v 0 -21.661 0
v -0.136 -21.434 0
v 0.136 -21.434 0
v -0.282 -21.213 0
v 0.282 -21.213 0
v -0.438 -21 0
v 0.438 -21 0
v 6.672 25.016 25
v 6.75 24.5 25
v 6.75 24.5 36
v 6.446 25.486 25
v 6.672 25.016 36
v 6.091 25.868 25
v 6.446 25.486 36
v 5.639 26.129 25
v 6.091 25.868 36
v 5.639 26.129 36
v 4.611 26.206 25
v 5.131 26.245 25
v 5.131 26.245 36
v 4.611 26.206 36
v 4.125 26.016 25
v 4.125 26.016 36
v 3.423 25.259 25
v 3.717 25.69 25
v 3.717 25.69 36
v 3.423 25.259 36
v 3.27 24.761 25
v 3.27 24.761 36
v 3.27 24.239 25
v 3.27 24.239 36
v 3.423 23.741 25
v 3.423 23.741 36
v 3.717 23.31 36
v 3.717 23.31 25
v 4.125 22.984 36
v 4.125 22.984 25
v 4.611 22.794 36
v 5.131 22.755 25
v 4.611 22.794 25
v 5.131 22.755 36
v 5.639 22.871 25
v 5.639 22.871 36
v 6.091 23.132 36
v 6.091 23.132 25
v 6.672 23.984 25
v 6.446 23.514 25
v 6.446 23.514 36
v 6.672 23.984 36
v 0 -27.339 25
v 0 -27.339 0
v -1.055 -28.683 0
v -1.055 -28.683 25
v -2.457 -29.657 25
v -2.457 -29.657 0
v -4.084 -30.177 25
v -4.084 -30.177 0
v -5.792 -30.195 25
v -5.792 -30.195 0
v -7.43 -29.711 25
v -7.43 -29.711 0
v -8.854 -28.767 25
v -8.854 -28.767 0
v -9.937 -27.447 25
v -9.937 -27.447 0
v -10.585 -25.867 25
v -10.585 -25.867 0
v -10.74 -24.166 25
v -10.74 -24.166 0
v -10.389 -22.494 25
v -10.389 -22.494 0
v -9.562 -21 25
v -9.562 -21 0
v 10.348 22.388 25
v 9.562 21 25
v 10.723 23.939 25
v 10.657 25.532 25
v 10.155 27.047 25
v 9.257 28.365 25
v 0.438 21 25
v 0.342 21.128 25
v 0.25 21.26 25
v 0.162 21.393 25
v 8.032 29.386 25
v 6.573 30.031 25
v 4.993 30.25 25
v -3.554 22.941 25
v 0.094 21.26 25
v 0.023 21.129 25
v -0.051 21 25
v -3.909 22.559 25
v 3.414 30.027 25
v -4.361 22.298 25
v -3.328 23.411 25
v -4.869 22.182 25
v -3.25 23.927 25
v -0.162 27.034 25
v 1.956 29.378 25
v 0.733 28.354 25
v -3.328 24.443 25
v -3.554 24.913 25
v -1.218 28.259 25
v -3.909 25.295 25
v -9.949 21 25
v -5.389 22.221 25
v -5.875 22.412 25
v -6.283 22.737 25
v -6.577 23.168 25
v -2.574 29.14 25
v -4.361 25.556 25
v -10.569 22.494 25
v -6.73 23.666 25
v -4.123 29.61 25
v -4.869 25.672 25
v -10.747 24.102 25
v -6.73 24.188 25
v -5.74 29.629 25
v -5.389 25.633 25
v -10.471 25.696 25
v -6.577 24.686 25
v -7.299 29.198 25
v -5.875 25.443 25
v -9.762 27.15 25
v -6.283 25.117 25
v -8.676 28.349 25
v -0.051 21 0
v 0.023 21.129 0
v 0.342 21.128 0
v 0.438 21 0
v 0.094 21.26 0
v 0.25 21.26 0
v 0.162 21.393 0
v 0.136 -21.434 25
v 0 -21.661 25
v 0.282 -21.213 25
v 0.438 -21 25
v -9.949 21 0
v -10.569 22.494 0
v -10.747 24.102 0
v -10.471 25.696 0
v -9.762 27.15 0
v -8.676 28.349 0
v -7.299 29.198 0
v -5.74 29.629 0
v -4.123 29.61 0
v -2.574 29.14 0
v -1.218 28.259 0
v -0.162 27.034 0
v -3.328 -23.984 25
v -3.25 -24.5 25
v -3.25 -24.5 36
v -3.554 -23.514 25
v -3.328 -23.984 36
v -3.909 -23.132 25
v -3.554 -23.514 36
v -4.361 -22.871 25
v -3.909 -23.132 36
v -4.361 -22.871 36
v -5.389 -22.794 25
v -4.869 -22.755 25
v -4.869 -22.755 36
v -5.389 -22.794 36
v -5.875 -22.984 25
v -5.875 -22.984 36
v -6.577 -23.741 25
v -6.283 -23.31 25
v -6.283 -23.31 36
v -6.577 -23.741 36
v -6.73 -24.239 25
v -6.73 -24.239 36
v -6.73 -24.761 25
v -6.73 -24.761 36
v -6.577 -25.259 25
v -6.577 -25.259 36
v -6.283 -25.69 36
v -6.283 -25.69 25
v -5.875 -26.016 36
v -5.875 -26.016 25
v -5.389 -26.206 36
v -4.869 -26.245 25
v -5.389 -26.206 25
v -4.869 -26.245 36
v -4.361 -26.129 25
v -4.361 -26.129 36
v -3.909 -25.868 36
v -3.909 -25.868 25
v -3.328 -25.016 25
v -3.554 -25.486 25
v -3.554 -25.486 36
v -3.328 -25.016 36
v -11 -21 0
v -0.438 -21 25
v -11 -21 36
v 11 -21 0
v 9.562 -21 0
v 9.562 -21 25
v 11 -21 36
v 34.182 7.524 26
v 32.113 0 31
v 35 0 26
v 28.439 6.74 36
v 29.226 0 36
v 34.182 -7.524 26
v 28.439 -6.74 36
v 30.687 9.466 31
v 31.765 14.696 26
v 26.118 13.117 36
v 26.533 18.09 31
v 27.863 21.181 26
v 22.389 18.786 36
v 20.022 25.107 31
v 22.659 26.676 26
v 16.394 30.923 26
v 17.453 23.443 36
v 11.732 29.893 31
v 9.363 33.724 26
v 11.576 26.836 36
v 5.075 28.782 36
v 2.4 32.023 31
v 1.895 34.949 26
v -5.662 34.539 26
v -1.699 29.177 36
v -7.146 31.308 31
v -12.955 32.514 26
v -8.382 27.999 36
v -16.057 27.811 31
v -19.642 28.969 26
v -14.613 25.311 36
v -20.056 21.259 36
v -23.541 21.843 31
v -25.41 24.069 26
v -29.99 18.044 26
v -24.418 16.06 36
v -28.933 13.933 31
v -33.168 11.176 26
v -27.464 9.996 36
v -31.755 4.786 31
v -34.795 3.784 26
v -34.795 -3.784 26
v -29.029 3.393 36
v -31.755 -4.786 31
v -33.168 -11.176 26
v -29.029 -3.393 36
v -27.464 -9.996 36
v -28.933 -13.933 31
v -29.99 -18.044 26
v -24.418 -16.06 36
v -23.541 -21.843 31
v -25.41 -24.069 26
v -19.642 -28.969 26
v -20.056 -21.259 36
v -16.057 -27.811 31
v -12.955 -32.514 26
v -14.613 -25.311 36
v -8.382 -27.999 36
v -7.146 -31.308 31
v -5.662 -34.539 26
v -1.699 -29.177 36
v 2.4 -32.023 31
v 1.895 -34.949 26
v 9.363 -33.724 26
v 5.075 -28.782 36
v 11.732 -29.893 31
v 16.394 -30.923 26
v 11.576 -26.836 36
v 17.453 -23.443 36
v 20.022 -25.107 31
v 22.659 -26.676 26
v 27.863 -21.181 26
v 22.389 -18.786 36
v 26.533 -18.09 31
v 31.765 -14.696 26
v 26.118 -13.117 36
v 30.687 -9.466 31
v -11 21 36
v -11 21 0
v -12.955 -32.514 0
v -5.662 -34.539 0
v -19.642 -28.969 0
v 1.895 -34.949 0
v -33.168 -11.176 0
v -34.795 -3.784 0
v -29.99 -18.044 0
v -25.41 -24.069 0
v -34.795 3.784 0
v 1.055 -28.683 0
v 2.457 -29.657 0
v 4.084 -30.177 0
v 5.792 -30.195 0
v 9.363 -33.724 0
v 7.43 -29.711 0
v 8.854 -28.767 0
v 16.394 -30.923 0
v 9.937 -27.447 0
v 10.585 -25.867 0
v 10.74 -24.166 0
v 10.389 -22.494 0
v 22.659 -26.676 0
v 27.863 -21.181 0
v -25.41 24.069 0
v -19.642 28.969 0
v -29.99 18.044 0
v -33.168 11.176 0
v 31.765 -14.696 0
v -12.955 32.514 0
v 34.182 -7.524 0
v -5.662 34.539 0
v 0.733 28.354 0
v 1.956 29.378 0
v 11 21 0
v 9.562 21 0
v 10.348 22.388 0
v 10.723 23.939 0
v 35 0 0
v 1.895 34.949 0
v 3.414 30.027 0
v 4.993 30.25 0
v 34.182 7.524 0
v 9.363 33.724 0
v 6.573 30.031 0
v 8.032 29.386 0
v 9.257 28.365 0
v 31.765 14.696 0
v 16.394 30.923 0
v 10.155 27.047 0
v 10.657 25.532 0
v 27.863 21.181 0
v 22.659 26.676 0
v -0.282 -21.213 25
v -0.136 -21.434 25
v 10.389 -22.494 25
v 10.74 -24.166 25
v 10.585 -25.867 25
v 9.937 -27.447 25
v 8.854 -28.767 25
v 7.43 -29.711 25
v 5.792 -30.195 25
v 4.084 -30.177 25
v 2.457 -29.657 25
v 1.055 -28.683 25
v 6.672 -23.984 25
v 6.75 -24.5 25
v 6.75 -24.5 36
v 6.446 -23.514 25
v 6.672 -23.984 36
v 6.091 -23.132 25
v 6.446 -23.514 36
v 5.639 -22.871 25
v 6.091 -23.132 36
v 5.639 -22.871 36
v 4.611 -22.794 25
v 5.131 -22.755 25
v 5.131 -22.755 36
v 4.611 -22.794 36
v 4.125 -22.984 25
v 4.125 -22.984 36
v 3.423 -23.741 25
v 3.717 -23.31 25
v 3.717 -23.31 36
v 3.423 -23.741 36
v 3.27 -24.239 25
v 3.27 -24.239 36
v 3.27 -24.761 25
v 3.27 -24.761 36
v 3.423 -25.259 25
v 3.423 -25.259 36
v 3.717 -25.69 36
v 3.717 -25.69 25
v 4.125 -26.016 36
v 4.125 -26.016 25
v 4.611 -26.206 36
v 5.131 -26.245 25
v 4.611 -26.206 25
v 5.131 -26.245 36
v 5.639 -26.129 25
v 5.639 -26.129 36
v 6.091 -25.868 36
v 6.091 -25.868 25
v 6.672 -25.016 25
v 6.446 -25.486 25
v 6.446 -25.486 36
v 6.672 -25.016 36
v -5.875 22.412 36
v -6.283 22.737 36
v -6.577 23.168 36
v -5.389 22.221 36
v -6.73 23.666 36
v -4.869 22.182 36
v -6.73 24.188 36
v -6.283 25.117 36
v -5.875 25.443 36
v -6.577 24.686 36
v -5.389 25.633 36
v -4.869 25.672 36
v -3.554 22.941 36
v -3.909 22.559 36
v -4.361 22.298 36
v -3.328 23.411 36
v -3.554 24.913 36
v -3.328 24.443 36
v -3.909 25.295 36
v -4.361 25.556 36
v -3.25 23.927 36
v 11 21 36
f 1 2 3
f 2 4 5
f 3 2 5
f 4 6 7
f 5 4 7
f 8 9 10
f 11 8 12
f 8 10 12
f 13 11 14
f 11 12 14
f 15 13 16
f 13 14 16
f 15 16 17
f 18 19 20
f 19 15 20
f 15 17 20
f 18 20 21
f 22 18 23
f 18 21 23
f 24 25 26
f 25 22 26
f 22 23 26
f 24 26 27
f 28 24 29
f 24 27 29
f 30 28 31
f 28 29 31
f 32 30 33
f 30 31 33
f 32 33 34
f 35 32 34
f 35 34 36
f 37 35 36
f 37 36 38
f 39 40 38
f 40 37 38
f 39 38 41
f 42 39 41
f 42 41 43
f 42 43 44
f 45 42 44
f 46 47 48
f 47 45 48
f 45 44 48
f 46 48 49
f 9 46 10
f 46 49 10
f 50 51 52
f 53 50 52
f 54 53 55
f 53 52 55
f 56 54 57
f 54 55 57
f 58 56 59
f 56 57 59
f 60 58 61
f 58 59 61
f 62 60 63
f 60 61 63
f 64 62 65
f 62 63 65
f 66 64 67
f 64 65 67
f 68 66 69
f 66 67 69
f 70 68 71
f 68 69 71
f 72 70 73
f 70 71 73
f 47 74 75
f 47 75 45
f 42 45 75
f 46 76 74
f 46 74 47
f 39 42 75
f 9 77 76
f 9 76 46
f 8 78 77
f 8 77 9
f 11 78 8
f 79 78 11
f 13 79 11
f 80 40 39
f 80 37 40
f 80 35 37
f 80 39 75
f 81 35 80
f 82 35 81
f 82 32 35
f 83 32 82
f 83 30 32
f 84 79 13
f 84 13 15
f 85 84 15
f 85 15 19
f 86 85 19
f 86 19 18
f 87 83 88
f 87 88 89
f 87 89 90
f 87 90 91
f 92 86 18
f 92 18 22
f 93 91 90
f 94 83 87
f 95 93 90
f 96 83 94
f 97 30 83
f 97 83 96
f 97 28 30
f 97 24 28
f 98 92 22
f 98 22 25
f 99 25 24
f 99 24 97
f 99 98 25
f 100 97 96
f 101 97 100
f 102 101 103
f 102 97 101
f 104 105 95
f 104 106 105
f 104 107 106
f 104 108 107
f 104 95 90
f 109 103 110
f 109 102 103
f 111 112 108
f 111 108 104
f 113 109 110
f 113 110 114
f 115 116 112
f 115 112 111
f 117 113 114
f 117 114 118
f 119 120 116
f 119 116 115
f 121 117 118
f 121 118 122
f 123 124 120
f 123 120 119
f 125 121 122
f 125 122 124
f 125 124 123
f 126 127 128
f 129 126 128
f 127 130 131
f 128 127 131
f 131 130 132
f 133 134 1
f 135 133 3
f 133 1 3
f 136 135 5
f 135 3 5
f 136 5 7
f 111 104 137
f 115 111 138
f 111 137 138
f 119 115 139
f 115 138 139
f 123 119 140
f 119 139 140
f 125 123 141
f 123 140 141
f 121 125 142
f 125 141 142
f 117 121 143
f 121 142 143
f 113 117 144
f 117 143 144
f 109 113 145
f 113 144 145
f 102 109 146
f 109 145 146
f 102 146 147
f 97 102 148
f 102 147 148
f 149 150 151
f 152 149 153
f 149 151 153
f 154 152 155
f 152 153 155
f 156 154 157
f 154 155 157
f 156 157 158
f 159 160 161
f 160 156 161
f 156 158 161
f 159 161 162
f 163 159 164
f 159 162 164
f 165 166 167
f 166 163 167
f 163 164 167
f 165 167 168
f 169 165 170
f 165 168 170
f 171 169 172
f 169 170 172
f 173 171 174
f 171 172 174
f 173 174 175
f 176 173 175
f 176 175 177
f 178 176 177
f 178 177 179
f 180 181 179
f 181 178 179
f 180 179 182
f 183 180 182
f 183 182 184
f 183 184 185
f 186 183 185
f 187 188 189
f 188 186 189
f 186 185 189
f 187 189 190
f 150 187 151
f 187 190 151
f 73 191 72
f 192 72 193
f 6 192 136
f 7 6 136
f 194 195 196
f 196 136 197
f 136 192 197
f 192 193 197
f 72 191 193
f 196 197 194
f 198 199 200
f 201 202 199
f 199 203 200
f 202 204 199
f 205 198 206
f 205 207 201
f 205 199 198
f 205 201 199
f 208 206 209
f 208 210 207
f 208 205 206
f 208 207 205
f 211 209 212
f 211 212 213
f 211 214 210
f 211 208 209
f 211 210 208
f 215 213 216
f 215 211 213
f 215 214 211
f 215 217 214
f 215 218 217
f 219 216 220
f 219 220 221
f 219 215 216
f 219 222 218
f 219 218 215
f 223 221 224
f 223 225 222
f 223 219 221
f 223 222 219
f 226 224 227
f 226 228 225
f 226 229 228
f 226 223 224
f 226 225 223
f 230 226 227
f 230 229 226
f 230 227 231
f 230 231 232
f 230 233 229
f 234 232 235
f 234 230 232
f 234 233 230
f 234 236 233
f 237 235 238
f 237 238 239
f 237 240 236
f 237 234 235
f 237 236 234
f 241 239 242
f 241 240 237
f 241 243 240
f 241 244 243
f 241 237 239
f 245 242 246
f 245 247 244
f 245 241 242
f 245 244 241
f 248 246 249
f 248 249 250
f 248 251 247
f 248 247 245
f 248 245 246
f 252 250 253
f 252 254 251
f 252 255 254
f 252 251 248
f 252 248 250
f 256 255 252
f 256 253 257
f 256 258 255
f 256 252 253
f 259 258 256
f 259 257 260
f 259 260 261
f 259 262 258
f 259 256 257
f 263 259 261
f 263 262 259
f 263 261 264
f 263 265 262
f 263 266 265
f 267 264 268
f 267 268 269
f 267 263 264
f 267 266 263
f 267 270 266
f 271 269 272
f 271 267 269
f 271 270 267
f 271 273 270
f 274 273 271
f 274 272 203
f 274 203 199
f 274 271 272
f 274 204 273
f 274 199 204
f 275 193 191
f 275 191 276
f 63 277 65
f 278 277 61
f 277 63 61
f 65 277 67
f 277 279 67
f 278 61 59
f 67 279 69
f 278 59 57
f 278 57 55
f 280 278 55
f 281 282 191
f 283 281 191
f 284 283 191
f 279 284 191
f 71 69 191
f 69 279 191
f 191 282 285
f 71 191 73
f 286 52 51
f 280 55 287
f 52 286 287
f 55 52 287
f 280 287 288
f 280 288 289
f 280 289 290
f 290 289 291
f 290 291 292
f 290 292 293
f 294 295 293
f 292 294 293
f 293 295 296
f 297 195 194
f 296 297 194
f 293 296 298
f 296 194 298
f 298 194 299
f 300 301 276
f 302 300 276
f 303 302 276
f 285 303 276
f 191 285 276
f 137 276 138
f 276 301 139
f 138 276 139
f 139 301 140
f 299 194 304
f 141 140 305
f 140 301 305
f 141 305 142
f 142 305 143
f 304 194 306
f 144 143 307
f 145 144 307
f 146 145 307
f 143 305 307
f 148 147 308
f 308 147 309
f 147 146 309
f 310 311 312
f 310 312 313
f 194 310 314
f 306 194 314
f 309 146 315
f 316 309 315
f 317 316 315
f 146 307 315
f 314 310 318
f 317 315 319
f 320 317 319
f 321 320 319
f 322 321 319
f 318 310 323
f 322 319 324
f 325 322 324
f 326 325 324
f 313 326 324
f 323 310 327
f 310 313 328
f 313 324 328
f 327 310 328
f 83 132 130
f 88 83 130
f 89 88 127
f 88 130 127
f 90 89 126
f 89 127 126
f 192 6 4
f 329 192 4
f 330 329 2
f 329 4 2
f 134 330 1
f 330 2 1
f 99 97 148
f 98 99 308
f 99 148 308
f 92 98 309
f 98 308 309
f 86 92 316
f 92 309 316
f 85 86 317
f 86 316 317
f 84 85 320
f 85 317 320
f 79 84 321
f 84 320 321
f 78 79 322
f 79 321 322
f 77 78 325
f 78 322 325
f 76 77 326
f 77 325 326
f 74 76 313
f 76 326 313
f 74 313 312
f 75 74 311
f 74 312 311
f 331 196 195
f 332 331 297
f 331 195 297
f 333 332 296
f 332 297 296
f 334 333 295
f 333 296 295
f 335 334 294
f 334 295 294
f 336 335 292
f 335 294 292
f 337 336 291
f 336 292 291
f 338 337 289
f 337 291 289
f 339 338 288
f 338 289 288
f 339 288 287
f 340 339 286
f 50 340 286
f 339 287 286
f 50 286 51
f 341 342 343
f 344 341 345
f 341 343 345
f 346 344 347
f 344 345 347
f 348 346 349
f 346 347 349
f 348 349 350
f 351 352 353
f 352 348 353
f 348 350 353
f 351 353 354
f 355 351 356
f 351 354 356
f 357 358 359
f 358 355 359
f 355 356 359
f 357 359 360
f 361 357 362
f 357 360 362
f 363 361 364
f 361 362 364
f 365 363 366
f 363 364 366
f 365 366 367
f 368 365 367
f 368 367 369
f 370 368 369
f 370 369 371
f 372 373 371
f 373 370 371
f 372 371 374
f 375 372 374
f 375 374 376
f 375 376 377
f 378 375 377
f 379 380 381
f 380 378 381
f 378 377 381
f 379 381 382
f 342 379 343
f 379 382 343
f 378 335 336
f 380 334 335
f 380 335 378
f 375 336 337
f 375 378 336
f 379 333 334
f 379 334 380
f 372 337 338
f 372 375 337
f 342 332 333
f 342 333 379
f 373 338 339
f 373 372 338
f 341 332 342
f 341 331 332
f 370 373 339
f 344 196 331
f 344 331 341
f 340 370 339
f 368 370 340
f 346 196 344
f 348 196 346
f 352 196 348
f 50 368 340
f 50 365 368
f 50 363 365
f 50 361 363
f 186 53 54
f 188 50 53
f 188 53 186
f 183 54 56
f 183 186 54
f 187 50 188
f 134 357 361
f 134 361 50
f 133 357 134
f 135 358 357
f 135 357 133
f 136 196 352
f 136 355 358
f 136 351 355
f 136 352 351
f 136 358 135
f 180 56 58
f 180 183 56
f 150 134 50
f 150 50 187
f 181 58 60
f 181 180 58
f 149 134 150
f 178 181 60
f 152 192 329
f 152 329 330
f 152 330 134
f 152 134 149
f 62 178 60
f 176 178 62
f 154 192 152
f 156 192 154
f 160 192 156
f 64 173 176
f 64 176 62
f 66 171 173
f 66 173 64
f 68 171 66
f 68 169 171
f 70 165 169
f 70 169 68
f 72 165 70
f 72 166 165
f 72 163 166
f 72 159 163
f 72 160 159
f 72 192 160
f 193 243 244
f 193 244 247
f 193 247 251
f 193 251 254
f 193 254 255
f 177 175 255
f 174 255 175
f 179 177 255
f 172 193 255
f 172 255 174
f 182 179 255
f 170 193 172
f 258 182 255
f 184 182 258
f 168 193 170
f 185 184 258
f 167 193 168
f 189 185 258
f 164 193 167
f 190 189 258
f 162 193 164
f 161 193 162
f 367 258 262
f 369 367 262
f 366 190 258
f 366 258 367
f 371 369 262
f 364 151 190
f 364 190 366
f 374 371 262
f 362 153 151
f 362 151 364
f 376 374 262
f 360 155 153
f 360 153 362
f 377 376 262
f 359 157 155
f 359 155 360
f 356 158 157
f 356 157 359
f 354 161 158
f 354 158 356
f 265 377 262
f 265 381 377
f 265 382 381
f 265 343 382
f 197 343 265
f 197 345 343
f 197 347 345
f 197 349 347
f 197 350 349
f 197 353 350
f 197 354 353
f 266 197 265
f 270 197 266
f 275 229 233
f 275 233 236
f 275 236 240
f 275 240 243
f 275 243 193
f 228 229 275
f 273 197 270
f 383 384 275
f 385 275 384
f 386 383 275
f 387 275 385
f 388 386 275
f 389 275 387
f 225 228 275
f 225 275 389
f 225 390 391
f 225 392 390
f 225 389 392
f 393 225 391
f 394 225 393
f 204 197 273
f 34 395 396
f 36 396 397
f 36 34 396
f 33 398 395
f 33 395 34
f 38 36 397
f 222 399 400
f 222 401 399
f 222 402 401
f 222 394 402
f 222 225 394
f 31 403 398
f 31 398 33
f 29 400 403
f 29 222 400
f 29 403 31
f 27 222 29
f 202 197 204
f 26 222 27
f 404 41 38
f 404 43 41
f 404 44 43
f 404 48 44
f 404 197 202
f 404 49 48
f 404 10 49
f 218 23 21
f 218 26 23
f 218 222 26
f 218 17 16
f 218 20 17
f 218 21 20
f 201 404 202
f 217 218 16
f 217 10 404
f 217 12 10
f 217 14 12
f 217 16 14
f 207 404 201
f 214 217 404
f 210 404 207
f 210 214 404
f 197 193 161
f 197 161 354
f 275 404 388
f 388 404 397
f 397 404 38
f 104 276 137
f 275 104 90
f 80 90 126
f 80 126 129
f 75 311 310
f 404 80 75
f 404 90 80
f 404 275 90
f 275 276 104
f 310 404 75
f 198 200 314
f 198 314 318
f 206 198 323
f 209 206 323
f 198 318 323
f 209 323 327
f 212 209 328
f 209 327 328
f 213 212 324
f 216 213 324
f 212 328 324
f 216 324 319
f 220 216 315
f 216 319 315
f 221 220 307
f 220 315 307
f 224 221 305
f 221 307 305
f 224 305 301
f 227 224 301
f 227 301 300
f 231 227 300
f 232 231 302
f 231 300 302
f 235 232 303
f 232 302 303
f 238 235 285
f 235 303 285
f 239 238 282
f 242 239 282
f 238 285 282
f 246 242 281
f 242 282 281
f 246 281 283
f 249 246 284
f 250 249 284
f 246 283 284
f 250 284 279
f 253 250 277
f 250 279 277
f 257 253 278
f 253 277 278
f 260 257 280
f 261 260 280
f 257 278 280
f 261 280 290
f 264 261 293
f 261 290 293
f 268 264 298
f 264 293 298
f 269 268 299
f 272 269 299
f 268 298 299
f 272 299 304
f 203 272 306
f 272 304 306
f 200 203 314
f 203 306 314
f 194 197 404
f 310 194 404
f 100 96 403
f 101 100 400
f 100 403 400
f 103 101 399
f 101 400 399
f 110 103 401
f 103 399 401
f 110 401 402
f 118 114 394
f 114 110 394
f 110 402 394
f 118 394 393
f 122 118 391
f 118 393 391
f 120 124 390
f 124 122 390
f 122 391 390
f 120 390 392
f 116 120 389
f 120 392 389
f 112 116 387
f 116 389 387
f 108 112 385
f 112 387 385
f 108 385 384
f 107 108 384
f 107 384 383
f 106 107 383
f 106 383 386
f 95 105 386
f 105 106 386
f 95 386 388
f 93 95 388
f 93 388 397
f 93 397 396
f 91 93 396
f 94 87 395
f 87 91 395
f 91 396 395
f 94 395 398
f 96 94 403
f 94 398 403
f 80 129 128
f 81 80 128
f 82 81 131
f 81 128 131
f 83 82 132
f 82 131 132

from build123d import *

# Parameters (mm, degrees)
SKETCH1_R           = 35
BOSS_EXTRUDE1_DEPTH = 36
CHAMFER1_SIZE       = 10
CHAMFER1_SIZE2      = 5.773502692
SKETCH2_W           = 22
SKETCH2_H           = 42
CUT_EXTRUDE1_DEPTH  = 37
SKETCH3_R           = 1.75
CUT_EXTRUDE2_DEPTH  = 37
SKETCH4_R           = 1.75
CUT_EXTRUDE3_DEPTH  = 25


with BuildPart() as part:
    # Sketch1 → Boss-Extrude1 (new body)
    with BuildSketch(Plane.XY):
        Circle(SKETCH1_R)
    extrude(amount=BOSS_EXTRUDE1_DEPTH)

    # Chamfer1
    chamfer1_edges = [part.edges().sort_by_distance(p)[0] for p in [
        (-35, 0, 36),
    ]]
    chamfer1_side = [part.faces().sort_by_distance(p)[0] for p in [
        (-35, 0, 18),
    ]]
    chamfer(chamfer1_edges, length=CHAMFER1_SIZE, length2=CHAMFER1_SIZE2, reference=chamfer1_side[0])

    # Sketch2 → Cut-Extrude1 (cut, through all)
    with BuildSketch(Plane.XY.offset(36)):
        Rectangle(SKETCH2_W, SKETCH2_H)
    extrude(amount=-CUT_EXTRUDE1_DEPTH, mode=Mode.SUBTRACT)

    # Sketch3 → Cut-Extrude2 (cut, through all)
    with BuildSketch(Plane.XY.offset(36)):
        with Locations((-5, 23.927118757)):
            Circle(SKETCH3_R)
        with Locations((5, 24.5)):
            Circle(SKETCH3_R)
        with Locations((5, -24.5)):
            Circle(SKETCH3_R)
        with Locations((-5, -24.5)):
            Circle(SKETCH3_R)
    extrude(amount=-CUT_EXTRUDE2_DEPTH, mode=Mode.SUBTRACT)

    # Sketch4 → Cut-Extrude3 (cut)
    with BuildSketch(Plane(origin=(0, 0, 0), x_dir=(-1, 0, 0), z_dir=(0, 0, -1))):
        with BuildLine():
            ThreePointArc((0, -21.660545827), (-10.75, -24.5), (0, -27.339454173))
            ThreePointArc((0, -27.339454173), (10.75, -24.5), (0, -21.660545827))
        make_face()
        with Locations((-5, -24.5)):
            Circle(SKETCH4_R, mode=Mode.SUBTRACT)
        with Locations((5, -24.5)):
            Circle(SKETCH4_R, mode=Mode.SUBTRACT)
        with BuildLine():
            ThreePointArc((-0.161572278, 21.393214334), (10.740587615, 23.59825126), (0.161572278, 27.033904423))
            ThreePointArc((0.161572278, 27.033904423), (-10.740587615, 24.828867497), (-0.161572278, 21.393214334))
        make_face()
        with Locations((5, 23.927118757)):
            Circle(SKETCH4_R, mode=Mode.SUBTRACT)
        with Locations((-5, 24.5)):
            Circle(SKETCH4_R, mode=Mode.SUBTRACT)
    extrude(amount=-CUT_EXTRUDE3_DEPTH, mode=Mode.SUBTRACT)


solid = part.part
